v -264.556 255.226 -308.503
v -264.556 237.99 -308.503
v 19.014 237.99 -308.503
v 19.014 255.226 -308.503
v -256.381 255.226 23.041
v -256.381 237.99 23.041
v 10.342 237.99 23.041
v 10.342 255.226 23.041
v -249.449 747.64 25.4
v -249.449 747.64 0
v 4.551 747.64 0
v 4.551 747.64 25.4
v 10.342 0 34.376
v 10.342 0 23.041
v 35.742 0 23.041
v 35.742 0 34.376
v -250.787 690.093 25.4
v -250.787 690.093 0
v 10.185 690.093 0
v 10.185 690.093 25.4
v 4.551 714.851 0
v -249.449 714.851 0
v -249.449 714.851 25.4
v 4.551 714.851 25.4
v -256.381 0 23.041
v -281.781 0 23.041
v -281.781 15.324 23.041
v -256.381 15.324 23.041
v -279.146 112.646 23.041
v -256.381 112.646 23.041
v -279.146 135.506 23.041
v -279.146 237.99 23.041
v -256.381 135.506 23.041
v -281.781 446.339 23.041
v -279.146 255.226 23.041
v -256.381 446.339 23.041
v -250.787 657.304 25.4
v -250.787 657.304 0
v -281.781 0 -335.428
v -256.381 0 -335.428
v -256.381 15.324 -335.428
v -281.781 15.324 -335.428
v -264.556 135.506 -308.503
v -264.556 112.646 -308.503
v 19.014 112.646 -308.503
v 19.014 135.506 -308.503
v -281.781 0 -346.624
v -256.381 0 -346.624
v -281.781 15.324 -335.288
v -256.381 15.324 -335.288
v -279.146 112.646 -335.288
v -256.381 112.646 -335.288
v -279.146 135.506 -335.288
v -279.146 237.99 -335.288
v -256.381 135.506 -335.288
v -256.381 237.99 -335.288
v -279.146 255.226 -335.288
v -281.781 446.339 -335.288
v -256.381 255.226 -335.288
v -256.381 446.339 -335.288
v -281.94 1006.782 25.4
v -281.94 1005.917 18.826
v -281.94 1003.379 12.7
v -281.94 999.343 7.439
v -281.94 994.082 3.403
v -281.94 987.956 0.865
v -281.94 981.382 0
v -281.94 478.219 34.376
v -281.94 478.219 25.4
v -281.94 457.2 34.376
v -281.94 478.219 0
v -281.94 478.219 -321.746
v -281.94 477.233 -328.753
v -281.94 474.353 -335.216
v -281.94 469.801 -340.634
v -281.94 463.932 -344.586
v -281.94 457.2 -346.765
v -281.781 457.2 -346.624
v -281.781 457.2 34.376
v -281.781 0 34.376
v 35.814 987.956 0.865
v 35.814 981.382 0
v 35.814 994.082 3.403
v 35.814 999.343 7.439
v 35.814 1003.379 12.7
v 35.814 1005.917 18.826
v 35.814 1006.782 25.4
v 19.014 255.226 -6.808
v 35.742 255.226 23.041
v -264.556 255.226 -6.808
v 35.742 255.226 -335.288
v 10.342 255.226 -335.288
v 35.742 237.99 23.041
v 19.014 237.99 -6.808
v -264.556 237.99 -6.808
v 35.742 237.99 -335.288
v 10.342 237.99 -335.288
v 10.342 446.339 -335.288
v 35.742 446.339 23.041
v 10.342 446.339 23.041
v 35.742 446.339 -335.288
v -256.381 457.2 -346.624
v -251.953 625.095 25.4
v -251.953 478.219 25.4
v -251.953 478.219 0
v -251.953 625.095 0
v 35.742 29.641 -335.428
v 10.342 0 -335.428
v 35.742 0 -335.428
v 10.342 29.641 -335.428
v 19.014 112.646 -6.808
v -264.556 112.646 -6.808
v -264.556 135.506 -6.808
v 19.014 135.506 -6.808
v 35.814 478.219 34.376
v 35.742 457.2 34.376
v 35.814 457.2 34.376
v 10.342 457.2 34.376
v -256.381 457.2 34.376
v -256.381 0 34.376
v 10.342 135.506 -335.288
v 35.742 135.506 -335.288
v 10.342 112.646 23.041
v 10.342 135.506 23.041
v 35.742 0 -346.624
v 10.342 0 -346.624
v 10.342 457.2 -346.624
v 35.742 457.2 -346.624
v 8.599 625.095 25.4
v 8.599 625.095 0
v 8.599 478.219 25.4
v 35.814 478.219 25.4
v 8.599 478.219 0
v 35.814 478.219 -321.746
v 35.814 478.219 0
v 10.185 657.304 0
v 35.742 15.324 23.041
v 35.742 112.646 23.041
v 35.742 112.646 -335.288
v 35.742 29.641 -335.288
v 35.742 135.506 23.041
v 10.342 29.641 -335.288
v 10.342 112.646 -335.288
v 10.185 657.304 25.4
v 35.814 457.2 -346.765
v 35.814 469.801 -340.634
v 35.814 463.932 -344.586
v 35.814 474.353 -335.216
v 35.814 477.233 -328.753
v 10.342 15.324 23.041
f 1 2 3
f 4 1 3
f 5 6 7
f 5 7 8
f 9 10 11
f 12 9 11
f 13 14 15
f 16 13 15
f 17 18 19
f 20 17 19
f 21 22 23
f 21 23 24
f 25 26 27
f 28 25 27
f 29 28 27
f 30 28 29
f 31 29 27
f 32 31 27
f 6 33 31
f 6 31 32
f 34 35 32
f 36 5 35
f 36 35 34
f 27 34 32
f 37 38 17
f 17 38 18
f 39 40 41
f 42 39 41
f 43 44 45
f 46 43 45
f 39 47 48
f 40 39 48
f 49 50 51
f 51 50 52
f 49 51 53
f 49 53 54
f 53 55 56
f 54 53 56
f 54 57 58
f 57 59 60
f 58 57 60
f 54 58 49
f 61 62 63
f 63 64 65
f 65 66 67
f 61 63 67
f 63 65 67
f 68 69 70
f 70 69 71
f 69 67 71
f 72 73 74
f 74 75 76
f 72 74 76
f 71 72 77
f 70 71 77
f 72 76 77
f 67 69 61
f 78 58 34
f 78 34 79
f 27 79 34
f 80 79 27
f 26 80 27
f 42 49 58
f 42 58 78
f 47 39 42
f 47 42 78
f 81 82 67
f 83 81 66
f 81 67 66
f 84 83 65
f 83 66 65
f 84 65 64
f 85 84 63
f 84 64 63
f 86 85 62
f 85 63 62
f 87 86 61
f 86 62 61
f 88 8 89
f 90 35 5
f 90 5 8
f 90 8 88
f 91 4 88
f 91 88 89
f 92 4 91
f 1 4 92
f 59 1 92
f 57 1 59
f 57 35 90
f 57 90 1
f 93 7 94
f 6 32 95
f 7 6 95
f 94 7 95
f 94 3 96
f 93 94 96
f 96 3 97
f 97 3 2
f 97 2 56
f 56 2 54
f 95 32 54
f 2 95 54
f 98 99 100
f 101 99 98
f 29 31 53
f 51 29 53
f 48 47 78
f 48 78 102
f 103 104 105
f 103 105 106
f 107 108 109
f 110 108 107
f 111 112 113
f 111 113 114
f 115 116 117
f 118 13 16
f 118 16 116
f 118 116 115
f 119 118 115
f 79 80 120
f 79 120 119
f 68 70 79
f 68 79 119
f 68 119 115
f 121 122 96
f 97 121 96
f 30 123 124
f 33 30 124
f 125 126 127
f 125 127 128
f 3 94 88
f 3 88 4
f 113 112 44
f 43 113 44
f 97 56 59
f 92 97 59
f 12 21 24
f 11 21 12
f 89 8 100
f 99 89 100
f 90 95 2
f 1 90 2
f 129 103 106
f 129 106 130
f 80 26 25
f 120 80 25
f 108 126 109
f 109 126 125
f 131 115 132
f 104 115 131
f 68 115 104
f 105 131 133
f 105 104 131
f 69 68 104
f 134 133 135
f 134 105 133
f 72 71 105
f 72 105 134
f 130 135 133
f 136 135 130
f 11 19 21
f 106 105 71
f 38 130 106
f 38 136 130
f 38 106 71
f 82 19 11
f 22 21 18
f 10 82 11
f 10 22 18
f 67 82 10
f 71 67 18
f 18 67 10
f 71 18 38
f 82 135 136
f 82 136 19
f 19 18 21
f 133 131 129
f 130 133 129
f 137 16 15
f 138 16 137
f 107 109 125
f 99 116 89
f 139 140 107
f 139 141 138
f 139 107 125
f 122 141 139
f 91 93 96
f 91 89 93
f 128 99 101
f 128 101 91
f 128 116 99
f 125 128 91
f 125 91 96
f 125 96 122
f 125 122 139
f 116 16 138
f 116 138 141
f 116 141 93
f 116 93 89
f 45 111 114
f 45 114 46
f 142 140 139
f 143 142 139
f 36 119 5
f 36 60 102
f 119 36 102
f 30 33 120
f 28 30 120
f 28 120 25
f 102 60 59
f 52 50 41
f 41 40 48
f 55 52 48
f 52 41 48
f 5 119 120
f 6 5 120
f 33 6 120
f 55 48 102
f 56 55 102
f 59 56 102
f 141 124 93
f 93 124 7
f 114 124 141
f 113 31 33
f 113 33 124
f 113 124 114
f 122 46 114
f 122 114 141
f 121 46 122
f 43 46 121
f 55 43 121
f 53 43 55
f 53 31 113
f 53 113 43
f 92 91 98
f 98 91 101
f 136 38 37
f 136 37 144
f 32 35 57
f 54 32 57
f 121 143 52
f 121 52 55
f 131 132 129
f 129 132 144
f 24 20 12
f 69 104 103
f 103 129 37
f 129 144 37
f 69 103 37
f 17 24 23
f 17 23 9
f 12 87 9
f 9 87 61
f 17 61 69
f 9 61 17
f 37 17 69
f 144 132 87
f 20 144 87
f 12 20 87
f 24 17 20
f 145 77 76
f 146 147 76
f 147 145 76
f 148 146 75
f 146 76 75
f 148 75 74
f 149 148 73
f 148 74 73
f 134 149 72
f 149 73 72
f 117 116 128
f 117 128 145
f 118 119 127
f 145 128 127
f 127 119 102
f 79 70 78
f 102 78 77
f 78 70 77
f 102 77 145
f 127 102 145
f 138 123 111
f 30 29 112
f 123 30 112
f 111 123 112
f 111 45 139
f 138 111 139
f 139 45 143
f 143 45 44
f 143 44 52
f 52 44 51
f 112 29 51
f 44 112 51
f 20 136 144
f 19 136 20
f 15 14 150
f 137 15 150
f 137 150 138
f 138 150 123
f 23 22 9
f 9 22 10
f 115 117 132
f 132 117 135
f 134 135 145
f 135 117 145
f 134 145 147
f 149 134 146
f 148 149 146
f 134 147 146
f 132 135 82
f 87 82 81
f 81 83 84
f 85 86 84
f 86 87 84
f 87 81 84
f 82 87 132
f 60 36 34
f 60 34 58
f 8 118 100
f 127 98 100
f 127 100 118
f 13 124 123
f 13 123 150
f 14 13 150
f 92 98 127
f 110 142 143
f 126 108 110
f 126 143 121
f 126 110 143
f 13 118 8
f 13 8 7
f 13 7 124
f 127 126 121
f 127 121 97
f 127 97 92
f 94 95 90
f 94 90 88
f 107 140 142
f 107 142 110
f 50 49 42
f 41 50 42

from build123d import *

# Parameters (mm, degrees)
SKETCH1_W                = 25.4
SKETCH1_H                = 381
BOSS_EXTRUDE1_DEPTH      = 457.2
BOSS_EXTRUDE1_2_DEPTH    = 457.2
SKETCH5_W                = 358.329211732
SKETCH5_H                = 431.015208417
CUT_EXTRUDE1_DEPTH       = 457.2
BOSS_EXTRUDE7_DEPTH      = 35.814
BOSS_EXTRUDE7_DEPTH_BACK = 281.94
SKETCH13_W               = 381.141342185
SKETCH13_H               = 21.019014934
SKETCH14_W               = 317.754
SKETCH14_H               = 526.086170676
BOSS_EXTRUDE8_DEPTH      = 25.4
SKETCH17_W               = 260.552131225
SKETCH17_H               = 146.876016362
SKETCH17_H_2             = 29.104227424
CUT_EXTRUDE3_DEPTH       = 25.4
BOSS_EXTRUDE9_DEPTH      = 25.4
SKETCH19_W               = 260.972204044
SKETCH19_H               = 32.78881538
SKETCH19_W_2             = 254
CUT_EXTRUDE6_DEPTH       = 35.56
FILLET1_R                = 25.4
FILLET2_R                = 25.4
SKETCH20_W               = 358.469269341
SKETCH20_H               = 15.323983409
CUT_EXTRUDE7_DEPTH       = 288.544
SKETCH21_W               = 358.469269341
SKETCH21_H               = 29.641446852
CUT_EXTRUDE8_DEPTH       = 80.772
BOSS_EXTRUDE10_START     = -279.146
SKETCH22_W               = 358.329211732
SKETCH22_H               = 17.235921955
SKETCH22_H_2             = 22.86
BOSS_EXTRUDE10_DEPTH     = 314.887549
CUT_EXTRUDE9_DEPTH       = 378.46
CUT_EXTRUDE9_DEPTH_BACK  = 279.146
SKETCH23_W               = 283.569919334
SKETCH23_H               = 301.695006961
SKETCH24_W               = 411.753611465
SKETCH24_H               = 408.769889643
CUT_EXTRUDE11_DEPTH      = 75.946
FILLET3_R                = 25.4


# Some blends are built 0.0001 mm under size
with BuildPart() as part:
    # Sketch1 → Boss-Extrude1 (new body)
    with BuildSketch(Plane(origin=(0, 0, 0), x_dir=(1, 0, 0), z_dir=(0, 1, 0))):
        with Locations((-269.080936413, 156.123579529)):
            Rectangle(SKETCH1_W, SKETCH1_H)
    extrude(amount=BOSS_EXTRUDE1_DEPTH)


with BuildPart() as body_2:
    # Sketch1 → Boss-Extrude1 2 (new body)
    with BuildSketch(Plane(origin=(0, 0, 0), x_dir=(1, 0, 0), z_dir=(0, 1, 0))):
        with Locations((23.041549082, 156.123579529)):
            Rectangle(SKETCH1_W, SKETCH1_H)
    extrude(amount=BOSS_EXTRUDE1_2_DEPTH)


with BuildPart() as cut_extrude1_tool:
    # Sketch5 → Cut-Extrude1 (new body)
    with BuildSketch(Plane(origin=(35.741549082, 0, 0), x_dir=(0, 0, -1), z_dir=(1, 0, 0))):
        with Locations((156.123579529, 230.831587618)):
            Rectangle(SKETCH5_W, SKETCH5_H)
    extrude(amount=-CUT_EXTRUDE1_DEPTH)


with BuildPart() as part_1:
    add(part.part)

    # Cut-Extrude1: cut by cut_extrude1_tool
    add(cut_extrude1_tool.part, mode=Mode.SUBTRACT)



with BuildPart() as body_2_1:
    add(body_2.part)

    # Cut-Extrude1: cut by cut_extrude1_tool
    add(cut_extrude1_tool.part, mode=Mode.SUBTRACT)


with BuildPart() as part_2:
    add(part_1.part)

    add(body_2_1.part)  # Boss-Extrude7 merges body 2
    # Sketch13 → Boss-Extrude7 (add, two sides: drawn at the far end of the back side and taken through both)
    with BuildSketch(Plane(origin=(0, 0, 0), x_dir=(0, 0, -1), z_dir=(1, 0, 0)).offset(-BOSS_EXTRUDE7_DEPTH_BACK)):
        with Locations((156.194250622, 467.709507467)):
            Rectangle(SKETCH13_W, SKETCH13_H)
    extrude(amount=BOSS_EXTRUDE7_DEPTH + BOSS_EXTRUDE7_DEPTH_BACK)

    # Sketch14 → Boss-Extrude8 (add)
    with BuildSketch(Plane.XY):
        with Locations((-123.063, 730.752592805)):
            Rectangle(SKETCH14_W, SKETCH14_H)
    extrude(amount=BOSS_EXTRUDE8_DEPTH)

    # Sketch17 → Cut-Extrude3 (cut)
    with BuildSketch(Plane.XY.offset(25.4)):
        with Locations((-121.677084409, 551.657023115)):
            Rectangle(SKETCH17_W, SKETCH17_H)
        with Locations((-121.677084409, 663.207710066)):
            Rectangle(SKETCH17_W, SKETCH17_H_2)
        with Locations((-121.677084409, 710.328840181)):
            Rectangle(SKETCH17_W, SKETCH17_H_2)
    extrude(amount=-CUT_EXTRUDE3_DEPTH, mode=Mode.SUBTRACT)

    # Sketch18 → Boss-Extrude9 (add)
    with BuildSketch(Plane.XY):
        Polygon((-281.94, 993.795678143), (-281.94, 1247.795678143), (35.814, 1247.795678143), (35.814, 993.795678143), (35.814, 478.219014934), (8.598981204, 478.219014934), (8.598981204, 625.095031296), (-251.953150021, 625.095031296), (-251.953150021, 478.219014934), (-281.94, 478.219014934), align=None)
    extrude(amount=BOSS_EXTRUDE9_DEPTH)

    # Sketch19 → Cut-Extrude6 (cut)
    with BuildSketch(Plane.XY):
        with Locations((-120.300778352, 673.69810694)):
            Rectangle(SKETCH19_W, SKETCH19_H)
        with Locations((-122.448561379, 731.24582373)):
            Rectangle(SKETCH19_W_2, SKETCH19_H)
    extrude(amount=CUT_EXTRUDE6_DEPTH, mode=Mode.SUBTRACT)

    # Fillet1
    fillet1_edges = [part_2.edges().sort_by_distance(p)[0] for p in [
        (-123.063, 1247.795678143, 0),
    ]]
    fillet(fillet1_edges, radius=FILLET1_R - 0.0001)  # a hair under: the kernel refuses the full size

    # Fillet2
    # the kernel refuses this fillet: 25.4 mm, written as the material it takes off along each edge
    with BuildSketch(Plane(origin=(-344.488329806, 478.219014934, -346.764921714), x_dir=(0, 0, 1), z_dir=(1, 0, 0))) as fillet2_piece_1:
        with BuildLine():
            CenterArc((25.019331923, 25.4), FILLET2_R, 189.932027033, 80.067972967)
            Line((0, 21.019014934), (-0.500386638, 20.931395233))
            ThreePointArc((-0.500386638, 20.931395233), (-0.508, 10.509507467), (-0.508, 0))
            Line((-0.508, 0), (0, -0.508))
            Line((0, -0.508), (25.019331923, -0.508))
            Line((25.019331923, -0.508), (25.019331923, 0))
        make_face()
    extrude(amount=442.850659613, mode=Mode.SUBTRACT)

    # Sketch20 → Cut-Extrude7 (cut)
    with BuildSketch(Plane(origin=(0, 0, 0), x_dir=(0, 0, -1), z_dir=(1, 0, 0))):
        with Locations((156.193608334, 7.661991705)):
            Rectangle(SKETCH20_W, SKETCH20_H)
    extrude(amount=-CUT_EXTRUDE7_DEPTH, mode=Mode.SUBTRACT)

    # Sketch21 → Cut-Extrude8 (cut)
    with BuildSketch(Plane(origin=(0, 0, 0), x_dir=(0, 0, -1), z_dir=(1, 0, 0))):
        with Locations((156.193608334, 14.820723426)):
            Rectangle(SKETCH21_W, SKETCH21_H)
    extrude(amount=CUT_EXTRUDE8_DEPTH, mode=Mode.SUBTRACT)

    # Sketch22 → Boss-Extrude10 (add)
    with BuildSketch(Plane(origin=(0, 0, 0), x_dir=(0, 0, -1), z_dir=(1, 0, 0)).offset(BOSS_EXTRUDE10_START)):
        with Locations((156.123579529, 246.608280317)):
            Rectangle(SKETCH22_W, SKETCH22_H)
        with Locations((156.123579529, 124.076015291)):
            Rectangle(SKETCH22_W, SKETCH22_H_2)
    extrude(amount=BOSS_EXTRUDE10_DEPTH)

    # Sketch23 → Cut-Extrude9 (cut, two sides: drawn at the far end of the back side and taken through both)
    with BuildSketch(Plane(origin=(0, 0, 0), x_dir=(1, 0, 0), z_dir=(0, 1, 0)).offset(-CUT_EXTRUDE9_DEPTH_BACK)):
        with Locations((-122.770659877, 157.655951237)):
            Rectangle(SKETCH23_W, SKETCH23_H)
    extrude(amount=CUT_EXTRUDE9_DEPTH + CUT_EXTRUDE9_DEPTH_BACK, mode=Mode.SUBTRACT)

    # Sketch24 → Cut-Extrude11 (cut)
    with BuildSketch(Plane.XY.offset(25.4)):
        with Locations((-113.714072953, 1211.167180329)):
            Rectangle(SKETCH24_W, SKETCH24_H)
    extrude(amount=-CUT_EXTRUDE11_DEPTH, mode=Mode.SUBTRACT)

    # Fillet3
    fillet3_edges = [part_2.edges().sort_by_distance(p)[0] for p in [
        (-123.063, 1006.782235507, 0),
    ]]
    fillet(fillet3_edges, radius=FILLET3_R - 0.0001)  # a hair under: the kernel refuses the full size


solid = part_2.part
